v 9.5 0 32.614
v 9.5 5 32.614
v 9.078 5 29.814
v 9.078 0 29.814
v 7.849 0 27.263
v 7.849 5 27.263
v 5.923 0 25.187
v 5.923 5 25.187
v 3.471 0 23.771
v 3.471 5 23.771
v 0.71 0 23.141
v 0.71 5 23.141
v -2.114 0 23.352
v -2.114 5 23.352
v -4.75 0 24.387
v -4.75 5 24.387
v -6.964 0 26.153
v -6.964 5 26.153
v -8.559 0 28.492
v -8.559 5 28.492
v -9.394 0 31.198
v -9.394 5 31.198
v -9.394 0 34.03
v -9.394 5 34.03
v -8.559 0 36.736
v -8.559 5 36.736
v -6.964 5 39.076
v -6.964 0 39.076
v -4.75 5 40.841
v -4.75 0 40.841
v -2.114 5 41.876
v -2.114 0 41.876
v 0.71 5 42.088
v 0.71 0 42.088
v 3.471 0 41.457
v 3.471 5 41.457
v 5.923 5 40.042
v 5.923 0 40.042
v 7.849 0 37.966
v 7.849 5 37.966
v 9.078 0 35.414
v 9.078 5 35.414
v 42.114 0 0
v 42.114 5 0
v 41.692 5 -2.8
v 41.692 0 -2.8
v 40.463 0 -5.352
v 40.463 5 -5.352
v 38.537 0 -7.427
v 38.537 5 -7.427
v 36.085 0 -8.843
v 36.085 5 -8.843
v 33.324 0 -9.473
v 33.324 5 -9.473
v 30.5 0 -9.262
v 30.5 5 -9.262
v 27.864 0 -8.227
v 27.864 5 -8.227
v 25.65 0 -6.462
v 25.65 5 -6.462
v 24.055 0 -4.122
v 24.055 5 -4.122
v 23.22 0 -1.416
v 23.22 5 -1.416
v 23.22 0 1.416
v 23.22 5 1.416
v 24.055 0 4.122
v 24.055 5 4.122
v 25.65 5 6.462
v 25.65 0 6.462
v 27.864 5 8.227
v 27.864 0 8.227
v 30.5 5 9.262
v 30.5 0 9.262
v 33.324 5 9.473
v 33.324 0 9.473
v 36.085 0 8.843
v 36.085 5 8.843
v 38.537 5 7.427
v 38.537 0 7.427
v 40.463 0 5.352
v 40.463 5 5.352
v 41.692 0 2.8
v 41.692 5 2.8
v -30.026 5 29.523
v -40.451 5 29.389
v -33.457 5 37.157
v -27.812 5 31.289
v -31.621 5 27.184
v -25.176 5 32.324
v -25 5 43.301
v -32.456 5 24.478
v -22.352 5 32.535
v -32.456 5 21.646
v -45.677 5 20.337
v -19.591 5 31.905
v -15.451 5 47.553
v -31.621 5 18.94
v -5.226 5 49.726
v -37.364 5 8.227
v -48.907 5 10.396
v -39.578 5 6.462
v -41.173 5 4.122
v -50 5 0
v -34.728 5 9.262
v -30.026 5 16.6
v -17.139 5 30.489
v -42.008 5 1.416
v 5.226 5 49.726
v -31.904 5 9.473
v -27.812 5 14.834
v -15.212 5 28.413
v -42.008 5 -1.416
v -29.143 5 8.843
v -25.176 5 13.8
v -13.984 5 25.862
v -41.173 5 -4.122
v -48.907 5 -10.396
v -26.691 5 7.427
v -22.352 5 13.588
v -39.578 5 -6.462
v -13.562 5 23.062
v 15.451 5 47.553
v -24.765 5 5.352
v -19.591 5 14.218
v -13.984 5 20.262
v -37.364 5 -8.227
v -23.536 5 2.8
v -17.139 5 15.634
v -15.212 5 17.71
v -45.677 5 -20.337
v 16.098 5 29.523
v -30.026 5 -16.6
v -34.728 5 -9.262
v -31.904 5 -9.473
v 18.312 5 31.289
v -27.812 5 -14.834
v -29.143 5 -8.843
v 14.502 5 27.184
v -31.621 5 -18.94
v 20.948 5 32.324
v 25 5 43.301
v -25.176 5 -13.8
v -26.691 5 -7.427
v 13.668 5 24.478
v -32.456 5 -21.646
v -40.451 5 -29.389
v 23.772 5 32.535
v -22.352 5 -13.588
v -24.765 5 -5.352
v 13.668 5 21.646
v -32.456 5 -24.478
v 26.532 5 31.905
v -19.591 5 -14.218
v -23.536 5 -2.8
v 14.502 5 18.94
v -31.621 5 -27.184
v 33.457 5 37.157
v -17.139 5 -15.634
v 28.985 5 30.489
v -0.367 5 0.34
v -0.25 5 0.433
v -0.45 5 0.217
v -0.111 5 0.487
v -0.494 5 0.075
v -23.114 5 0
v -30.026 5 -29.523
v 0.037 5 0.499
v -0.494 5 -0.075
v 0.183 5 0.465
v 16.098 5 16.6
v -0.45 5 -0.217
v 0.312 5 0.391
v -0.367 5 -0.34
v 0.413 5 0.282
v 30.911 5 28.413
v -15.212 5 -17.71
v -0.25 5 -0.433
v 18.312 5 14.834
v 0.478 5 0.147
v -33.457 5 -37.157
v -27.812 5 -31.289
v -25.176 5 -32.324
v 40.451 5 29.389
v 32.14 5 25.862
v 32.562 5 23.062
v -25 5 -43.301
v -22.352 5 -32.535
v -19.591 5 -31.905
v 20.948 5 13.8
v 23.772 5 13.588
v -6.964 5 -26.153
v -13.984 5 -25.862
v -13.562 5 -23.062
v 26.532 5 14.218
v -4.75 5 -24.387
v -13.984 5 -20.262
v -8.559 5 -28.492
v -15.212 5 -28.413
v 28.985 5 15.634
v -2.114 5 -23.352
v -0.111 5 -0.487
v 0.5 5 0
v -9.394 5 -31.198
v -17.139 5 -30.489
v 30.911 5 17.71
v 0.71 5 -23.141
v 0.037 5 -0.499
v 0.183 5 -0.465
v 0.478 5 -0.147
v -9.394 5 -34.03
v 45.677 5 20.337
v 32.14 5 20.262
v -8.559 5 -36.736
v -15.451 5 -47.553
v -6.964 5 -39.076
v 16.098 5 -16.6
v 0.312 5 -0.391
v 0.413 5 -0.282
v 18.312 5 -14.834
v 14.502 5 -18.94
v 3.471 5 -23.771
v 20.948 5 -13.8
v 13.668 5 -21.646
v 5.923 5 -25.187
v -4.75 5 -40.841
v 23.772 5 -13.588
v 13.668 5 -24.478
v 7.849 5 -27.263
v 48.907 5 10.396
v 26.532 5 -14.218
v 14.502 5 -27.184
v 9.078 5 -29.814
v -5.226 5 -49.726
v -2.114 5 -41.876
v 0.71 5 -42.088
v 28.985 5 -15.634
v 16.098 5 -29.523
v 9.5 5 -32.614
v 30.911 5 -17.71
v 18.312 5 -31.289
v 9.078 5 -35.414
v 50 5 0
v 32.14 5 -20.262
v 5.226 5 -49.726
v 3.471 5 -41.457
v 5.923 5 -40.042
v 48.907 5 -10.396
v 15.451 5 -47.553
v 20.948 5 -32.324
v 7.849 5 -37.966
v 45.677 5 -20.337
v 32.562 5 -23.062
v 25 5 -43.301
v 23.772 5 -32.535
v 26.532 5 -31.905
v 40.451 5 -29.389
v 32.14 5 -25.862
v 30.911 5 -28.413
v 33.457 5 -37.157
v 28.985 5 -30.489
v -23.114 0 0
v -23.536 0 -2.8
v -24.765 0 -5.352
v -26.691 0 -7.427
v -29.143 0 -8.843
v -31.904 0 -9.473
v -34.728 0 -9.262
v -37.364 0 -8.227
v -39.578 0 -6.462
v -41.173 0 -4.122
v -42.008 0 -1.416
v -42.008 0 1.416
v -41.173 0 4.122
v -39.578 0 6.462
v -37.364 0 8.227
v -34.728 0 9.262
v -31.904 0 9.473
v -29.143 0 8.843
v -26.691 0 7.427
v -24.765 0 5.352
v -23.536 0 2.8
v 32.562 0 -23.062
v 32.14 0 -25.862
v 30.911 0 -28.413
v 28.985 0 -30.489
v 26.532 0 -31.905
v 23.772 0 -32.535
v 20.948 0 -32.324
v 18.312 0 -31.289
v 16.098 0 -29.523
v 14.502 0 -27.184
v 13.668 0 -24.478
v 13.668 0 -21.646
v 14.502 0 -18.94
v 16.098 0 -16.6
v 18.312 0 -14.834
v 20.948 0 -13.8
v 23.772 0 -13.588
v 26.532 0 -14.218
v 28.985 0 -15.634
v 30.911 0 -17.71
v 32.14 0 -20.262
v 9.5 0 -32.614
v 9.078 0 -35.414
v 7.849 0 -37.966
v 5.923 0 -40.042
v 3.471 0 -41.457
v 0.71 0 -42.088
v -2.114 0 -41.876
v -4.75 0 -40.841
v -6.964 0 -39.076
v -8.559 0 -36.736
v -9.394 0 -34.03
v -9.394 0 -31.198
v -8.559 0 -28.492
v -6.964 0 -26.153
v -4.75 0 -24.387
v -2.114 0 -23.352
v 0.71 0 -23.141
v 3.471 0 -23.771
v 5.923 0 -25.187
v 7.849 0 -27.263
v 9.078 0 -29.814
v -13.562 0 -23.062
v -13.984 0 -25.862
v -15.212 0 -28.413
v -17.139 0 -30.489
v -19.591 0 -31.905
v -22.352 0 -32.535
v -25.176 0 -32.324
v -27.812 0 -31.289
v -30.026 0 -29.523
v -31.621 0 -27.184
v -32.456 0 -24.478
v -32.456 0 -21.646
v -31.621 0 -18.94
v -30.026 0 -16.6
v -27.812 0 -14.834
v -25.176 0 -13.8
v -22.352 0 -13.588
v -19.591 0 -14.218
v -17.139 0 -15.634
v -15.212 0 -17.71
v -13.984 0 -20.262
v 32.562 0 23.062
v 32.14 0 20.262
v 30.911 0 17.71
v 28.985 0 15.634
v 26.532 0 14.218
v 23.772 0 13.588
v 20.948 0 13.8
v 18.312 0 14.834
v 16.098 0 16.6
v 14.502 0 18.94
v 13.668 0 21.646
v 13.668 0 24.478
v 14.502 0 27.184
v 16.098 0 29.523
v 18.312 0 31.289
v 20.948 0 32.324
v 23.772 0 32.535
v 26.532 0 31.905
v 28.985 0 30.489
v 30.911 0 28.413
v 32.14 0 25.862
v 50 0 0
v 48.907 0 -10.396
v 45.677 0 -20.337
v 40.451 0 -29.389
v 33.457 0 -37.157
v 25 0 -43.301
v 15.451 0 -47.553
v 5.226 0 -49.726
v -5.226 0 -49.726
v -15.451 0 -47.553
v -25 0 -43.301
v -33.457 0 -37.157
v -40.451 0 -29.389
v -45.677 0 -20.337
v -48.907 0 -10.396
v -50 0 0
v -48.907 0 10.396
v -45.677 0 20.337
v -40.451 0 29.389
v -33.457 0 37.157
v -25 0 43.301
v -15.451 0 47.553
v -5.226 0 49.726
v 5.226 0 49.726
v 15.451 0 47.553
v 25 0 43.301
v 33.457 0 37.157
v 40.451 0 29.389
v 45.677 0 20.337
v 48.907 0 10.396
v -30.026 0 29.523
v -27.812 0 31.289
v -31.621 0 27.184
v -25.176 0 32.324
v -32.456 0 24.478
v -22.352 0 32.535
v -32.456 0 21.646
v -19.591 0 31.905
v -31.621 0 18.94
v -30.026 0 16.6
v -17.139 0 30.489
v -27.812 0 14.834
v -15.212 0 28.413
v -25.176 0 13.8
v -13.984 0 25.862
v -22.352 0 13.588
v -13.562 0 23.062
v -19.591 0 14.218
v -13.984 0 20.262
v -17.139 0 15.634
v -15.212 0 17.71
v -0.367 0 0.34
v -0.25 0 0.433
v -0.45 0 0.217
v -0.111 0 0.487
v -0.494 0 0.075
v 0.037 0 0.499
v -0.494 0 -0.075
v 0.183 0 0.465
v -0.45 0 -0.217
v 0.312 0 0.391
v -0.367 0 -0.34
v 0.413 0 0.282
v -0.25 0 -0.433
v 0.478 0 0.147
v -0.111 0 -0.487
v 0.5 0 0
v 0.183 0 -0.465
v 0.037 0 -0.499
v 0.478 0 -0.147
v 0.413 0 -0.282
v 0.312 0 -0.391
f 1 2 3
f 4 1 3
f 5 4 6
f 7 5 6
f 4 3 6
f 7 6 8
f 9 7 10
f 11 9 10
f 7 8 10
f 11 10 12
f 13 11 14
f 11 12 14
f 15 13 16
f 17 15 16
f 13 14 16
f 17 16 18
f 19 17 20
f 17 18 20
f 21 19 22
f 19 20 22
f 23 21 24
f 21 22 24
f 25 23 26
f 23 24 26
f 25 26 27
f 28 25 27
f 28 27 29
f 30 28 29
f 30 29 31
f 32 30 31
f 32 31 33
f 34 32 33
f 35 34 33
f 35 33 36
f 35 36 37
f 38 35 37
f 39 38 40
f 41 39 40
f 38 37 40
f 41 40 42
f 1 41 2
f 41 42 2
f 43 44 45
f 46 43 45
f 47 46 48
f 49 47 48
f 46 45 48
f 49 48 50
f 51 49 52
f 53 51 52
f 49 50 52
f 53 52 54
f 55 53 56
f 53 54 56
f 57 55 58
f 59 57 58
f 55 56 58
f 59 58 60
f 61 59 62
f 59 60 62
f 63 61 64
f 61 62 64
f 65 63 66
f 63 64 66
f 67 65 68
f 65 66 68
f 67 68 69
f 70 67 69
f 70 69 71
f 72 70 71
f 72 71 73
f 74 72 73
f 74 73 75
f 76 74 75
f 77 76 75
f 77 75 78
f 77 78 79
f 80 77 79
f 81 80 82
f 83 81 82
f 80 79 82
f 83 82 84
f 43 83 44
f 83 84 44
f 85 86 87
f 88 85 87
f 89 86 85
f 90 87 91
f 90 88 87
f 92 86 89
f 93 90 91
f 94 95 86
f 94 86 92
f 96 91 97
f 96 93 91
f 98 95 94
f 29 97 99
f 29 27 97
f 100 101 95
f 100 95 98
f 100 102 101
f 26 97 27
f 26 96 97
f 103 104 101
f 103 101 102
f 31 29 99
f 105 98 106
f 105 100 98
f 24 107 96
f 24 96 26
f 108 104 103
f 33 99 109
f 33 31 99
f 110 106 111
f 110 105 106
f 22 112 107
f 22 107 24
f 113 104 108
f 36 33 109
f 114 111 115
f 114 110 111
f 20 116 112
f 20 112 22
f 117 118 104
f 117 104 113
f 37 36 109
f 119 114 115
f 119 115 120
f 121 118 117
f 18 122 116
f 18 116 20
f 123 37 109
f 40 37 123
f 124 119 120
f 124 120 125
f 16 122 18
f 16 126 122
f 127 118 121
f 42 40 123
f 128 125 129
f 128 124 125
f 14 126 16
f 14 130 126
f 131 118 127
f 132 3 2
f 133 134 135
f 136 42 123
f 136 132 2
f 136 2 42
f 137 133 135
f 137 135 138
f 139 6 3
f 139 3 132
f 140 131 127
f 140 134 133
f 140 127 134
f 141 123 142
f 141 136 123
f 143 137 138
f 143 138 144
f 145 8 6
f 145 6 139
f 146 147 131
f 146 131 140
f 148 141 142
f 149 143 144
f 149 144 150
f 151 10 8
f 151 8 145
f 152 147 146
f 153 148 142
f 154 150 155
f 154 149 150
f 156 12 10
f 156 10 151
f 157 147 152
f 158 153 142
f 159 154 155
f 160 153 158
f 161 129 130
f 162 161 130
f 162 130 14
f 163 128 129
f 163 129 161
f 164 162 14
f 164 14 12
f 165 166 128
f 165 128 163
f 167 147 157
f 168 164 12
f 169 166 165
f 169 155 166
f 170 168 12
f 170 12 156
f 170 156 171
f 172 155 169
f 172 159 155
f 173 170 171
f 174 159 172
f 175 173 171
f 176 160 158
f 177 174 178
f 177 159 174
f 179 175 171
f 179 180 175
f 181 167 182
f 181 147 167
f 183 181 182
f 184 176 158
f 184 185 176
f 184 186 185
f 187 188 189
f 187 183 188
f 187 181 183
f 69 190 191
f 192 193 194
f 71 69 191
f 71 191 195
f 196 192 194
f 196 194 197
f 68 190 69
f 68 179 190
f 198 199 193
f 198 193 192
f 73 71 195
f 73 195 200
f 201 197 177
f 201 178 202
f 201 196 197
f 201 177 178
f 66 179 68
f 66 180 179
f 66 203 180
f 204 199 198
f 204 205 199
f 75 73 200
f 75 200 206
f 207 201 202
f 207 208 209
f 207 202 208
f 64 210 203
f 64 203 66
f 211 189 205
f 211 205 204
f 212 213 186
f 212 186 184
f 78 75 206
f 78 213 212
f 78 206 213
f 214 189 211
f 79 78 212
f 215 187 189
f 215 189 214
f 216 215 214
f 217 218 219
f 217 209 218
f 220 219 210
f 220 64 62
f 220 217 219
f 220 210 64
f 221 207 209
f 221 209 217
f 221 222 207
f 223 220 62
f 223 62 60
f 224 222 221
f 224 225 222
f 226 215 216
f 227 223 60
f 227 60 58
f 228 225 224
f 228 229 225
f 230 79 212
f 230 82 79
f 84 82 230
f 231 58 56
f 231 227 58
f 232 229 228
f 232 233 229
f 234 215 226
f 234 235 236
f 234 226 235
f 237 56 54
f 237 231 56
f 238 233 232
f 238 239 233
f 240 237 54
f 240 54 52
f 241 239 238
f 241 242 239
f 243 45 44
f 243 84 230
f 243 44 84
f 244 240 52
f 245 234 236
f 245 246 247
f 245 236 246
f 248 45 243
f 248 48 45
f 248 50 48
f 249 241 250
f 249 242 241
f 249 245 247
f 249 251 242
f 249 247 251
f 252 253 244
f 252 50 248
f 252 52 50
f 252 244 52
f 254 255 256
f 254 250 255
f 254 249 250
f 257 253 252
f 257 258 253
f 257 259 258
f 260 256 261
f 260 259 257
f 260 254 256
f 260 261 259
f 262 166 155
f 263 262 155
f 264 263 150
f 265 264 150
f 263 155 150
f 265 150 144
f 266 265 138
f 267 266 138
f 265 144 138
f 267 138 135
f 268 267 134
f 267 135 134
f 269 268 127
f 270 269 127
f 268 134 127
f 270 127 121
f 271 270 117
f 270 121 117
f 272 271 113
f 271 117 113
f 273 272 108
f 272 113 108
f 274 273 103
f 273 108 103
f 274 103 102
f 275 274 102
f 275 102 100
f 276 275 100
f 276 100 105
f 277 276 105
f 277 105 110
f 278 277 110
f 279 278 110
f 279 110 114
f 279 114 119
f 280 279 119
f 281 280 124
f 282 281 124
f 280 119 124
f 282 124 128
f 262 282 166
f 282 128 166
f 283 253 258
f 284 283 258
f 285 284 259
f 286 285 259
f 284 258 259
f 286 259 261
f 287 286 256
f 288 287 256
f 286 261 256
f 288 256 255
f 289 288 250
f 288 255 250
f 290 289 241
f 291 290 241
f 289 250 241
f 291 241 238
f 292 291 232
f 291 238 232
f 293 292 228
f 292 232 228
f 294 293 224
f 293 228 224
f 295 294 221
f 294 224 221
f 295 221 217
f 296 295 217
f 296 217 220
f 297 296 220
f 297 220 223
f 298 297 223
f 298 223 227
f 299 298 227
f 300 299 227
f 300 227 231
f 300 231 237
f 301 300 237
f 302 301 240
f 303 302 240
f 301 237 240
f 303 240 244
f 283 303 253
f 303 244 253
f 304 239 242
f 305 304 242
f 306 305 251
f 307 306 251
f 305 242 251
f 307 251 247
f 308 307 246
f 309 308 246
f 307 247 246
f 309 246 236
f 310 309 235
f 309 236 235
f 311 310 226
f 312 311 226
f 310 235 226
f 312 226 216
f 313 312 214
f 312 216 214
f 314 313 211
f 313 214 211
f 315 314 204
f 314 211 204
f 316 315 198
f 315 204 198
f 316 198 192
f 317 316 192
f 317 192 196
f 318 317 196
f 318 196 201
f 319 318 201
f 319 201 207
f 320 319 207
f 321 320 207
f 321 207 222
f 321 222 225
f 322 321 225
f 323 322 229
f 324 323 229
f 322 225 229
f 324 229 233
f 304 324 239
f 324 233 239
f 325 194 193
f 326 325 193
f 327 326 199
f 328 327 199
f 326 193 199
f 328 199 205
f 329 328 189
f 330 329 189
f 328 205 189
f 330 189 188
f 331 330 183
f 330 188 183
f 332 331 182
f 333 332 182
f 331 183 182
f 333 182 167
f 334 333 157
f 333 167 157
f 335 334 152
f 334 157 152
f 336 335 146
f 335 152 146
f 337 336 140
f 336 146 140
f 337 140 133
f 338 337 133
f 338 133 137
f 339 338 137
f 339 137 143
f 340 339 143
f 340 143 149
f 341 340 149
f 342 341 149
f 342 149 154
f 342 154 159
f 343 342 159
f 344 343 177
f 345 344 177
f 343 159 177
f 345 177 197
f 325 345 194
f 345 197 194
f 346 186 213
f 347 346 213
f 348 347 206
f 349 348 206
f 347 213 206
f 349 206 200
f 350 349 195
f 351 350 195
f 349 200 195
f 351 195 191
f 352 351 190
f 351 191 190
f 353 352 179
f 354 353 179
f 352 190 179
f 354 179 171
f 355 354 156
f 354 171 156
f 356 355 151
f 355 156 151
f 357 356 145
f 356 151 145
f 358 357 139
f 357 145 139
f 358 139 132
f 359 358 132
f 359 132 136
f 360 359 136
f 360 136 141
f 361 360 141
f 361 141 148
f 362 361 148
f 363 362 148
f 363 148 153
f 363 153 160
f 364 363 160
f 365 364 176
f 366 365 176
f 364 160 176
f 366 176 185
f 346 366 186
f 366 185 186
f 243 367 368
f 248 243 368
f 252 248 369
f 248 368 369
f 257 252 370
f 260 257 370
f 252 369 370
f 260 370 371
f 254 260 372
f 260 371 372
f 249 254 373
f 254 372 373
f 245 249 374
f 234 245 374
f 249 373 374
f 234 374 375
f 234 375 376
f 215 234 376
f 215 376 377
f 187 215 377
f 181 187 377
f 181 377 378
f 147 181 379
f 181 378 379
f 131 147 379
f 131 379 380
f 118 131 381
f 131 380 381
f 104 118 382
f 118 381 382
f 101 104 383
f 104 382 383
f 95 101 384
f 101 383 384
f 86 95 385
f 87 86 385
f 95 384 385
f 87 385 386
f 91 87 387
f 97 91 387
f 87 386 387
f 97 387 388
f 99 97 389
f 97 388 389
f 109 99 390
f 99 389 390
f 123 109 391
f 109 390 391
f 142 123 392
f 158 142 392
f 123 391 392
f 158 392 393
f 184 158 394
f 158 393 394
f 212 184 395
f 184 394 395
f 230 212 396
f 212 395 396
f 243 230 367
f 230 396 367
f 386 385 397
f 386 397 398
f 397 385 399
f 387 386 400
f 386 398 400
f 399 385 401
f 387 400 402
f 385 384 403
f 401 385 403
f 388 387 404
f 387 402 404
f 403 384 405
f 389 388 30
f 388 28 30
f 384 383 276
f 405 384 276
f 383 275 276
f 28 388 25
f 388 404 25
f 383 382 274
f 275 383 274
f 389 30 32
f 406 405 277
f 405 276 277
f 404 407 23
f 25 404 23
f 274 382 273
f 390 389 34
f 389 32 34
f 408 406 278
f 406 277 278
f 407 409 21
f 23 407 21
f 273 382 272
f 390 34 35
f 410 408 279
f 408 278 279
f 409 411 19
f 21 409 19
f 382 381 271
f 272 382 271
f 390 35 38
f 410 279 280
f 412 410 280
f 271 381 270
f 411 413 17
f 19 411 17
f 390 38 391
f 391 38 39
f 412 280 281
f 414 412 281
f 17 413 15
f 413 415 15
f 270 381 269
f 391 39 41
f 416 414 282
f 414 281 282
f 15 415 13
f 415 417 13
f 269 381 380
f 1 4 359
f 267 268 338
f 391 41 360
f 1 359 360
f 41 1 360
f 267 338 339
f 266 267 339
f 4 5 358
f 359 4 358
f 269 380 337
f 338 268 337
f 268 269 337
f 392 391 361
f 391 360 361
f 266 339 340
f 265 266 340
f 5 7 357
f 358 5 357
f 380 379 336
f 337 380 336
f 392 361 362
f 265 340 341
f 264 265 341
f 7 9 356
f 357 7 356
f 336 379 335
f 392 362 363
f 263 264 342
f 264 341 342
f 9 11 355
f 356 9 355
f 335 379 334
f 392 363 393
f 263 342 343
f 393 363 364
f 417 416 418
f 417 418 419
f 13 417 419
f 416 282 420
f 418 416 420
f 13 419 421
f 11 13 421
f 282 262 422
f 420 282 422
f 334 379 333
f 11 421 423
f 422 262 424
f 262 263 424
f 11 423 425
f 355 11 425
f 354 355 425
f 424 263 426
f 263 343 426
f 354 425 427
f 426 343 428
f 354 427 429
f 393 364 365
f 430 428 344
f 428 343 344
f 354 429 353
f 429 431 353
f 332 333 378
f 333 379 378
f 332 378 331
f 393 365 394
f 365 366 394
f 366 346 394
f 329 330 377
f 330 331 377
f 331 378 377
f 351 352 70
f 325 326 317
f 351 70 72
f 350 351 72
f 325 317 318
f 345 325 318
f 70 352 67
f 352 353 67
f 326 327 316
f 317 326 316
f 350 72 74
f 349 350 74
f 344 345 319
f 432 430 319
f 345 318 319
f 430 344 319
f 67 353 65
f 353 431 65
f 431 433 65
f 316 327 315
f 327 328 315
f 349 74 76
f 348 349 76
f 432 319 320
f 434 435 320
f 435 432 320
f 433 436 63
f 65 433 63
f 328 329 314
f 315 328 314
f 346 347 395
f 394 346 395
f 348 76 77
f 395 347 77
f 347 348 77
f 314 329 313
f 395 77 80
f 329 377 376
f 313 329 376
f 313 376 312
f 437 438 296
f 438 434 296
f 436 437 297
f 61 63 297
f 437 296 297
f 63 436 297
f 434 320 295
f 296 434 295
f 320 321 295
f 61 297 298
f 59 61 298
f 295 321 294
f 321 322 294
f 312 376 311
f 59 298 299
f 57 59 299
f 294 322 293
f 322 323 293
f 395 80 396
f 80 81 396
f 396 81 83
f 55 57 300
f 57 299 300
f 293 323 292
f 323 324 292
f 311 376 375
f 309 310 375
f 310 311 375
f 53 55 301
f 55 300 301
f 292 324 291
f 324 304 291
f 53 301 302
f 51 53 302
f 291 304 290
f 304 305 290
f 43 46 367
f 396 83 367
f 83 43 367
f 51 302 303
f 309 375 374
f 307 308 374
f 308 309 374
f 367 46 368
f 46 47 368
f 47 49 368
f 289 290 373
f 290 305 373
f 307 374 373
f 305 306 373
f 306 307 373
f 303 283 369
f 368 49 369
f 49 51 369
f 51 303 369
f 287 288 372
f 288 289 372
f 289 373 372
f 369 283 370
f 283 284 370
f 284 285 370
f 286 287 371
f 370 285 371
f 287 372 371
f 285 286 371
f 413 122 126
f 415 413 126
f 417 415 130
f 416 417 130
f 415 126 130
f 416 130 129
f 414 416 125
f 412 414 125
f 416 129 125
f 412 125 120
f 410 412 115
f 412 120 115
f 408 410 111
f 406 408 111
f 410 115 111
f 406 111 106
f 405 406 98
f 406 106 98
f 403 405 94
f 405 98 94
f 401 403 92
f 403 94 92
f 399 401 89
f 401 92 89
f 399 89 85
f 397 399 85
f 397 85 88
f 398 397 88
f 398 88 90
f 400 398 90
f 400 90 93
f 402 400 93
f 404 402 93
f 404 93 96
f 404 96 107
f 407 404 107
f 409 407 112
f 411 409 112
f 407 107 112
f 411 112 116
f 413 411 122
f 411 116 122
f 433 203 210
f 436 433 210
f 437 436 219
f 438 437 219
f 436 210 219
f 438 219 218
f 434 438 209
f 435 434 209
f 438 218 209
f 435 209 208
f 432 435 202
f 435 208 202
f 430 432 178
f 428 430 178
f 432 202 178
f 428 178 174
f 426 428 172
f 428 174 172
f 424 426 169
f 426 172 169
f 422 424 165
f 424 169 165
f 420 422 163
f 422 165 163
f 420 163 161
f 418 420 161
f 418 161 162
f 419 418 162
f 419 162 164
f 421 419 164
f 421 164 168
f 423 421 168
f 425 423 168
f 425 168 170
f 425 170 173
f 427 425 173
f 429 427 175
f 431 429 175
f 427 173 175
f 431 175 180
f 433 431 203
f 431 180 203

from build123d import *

# Parameters (mm, degrees)
SKETCH1_R           = 50
BOSS_EXTRUDE1_DEPTH = 5
SKETCH2_R           = 9.5
SKETCH2_R_2         = 0.5
CUT_EXTRUDE1_DEPTH  = 5


with BuildPart() as part:
    # Sketch1 → Boss-Extrude1 (new body)
    with BuildSketch(Plane(origin=(0, 0, 0), x_dir=(1, 0, 0), z_dir=(0, 1, 0))):
        Circle(SKETCH1_R)
    extrude(amount=BOSS_EXTRUDE1_DEPTH)

    # Sketch2 → Cut-Extrude1 (cut)
    with BuildSketch(Plane(origin=(0, 5, 0), x_dir=(1, 0, 0), z_dir=(0, 1, 0))):
        with Locations((0, 32.614161607)):
            Circle(SKETCH2_R)
        Circle(SKETCH2_R_2)
        with Locations((23.061694835, 23.061694835)):
            Circle(SKETCH2_R)
        with Locations((32.614161607, 0)):
            Circle(SKETCH2_R)
        with Locations((23.061694835, -23.061694835)):
            Circle(SKETCH2_R)
        with Locations((0, -32.614161607)):
            Circle(SKETCH2_R)
        with Locations((-23.061694835, -23.061694835)):
            Circle(SKETCH2_R)
        with Locations((-32.614161607, 0)):
            Circle(SKETCH2_R)
        with Locations((-23.061694835, 23.061694835)):
            Circle(SKETCH2_R)
    extrude(amount=-CUT_EXTRUDE1_DEPTH, mode=Mode.SUBTRACT)


solid = part.part
